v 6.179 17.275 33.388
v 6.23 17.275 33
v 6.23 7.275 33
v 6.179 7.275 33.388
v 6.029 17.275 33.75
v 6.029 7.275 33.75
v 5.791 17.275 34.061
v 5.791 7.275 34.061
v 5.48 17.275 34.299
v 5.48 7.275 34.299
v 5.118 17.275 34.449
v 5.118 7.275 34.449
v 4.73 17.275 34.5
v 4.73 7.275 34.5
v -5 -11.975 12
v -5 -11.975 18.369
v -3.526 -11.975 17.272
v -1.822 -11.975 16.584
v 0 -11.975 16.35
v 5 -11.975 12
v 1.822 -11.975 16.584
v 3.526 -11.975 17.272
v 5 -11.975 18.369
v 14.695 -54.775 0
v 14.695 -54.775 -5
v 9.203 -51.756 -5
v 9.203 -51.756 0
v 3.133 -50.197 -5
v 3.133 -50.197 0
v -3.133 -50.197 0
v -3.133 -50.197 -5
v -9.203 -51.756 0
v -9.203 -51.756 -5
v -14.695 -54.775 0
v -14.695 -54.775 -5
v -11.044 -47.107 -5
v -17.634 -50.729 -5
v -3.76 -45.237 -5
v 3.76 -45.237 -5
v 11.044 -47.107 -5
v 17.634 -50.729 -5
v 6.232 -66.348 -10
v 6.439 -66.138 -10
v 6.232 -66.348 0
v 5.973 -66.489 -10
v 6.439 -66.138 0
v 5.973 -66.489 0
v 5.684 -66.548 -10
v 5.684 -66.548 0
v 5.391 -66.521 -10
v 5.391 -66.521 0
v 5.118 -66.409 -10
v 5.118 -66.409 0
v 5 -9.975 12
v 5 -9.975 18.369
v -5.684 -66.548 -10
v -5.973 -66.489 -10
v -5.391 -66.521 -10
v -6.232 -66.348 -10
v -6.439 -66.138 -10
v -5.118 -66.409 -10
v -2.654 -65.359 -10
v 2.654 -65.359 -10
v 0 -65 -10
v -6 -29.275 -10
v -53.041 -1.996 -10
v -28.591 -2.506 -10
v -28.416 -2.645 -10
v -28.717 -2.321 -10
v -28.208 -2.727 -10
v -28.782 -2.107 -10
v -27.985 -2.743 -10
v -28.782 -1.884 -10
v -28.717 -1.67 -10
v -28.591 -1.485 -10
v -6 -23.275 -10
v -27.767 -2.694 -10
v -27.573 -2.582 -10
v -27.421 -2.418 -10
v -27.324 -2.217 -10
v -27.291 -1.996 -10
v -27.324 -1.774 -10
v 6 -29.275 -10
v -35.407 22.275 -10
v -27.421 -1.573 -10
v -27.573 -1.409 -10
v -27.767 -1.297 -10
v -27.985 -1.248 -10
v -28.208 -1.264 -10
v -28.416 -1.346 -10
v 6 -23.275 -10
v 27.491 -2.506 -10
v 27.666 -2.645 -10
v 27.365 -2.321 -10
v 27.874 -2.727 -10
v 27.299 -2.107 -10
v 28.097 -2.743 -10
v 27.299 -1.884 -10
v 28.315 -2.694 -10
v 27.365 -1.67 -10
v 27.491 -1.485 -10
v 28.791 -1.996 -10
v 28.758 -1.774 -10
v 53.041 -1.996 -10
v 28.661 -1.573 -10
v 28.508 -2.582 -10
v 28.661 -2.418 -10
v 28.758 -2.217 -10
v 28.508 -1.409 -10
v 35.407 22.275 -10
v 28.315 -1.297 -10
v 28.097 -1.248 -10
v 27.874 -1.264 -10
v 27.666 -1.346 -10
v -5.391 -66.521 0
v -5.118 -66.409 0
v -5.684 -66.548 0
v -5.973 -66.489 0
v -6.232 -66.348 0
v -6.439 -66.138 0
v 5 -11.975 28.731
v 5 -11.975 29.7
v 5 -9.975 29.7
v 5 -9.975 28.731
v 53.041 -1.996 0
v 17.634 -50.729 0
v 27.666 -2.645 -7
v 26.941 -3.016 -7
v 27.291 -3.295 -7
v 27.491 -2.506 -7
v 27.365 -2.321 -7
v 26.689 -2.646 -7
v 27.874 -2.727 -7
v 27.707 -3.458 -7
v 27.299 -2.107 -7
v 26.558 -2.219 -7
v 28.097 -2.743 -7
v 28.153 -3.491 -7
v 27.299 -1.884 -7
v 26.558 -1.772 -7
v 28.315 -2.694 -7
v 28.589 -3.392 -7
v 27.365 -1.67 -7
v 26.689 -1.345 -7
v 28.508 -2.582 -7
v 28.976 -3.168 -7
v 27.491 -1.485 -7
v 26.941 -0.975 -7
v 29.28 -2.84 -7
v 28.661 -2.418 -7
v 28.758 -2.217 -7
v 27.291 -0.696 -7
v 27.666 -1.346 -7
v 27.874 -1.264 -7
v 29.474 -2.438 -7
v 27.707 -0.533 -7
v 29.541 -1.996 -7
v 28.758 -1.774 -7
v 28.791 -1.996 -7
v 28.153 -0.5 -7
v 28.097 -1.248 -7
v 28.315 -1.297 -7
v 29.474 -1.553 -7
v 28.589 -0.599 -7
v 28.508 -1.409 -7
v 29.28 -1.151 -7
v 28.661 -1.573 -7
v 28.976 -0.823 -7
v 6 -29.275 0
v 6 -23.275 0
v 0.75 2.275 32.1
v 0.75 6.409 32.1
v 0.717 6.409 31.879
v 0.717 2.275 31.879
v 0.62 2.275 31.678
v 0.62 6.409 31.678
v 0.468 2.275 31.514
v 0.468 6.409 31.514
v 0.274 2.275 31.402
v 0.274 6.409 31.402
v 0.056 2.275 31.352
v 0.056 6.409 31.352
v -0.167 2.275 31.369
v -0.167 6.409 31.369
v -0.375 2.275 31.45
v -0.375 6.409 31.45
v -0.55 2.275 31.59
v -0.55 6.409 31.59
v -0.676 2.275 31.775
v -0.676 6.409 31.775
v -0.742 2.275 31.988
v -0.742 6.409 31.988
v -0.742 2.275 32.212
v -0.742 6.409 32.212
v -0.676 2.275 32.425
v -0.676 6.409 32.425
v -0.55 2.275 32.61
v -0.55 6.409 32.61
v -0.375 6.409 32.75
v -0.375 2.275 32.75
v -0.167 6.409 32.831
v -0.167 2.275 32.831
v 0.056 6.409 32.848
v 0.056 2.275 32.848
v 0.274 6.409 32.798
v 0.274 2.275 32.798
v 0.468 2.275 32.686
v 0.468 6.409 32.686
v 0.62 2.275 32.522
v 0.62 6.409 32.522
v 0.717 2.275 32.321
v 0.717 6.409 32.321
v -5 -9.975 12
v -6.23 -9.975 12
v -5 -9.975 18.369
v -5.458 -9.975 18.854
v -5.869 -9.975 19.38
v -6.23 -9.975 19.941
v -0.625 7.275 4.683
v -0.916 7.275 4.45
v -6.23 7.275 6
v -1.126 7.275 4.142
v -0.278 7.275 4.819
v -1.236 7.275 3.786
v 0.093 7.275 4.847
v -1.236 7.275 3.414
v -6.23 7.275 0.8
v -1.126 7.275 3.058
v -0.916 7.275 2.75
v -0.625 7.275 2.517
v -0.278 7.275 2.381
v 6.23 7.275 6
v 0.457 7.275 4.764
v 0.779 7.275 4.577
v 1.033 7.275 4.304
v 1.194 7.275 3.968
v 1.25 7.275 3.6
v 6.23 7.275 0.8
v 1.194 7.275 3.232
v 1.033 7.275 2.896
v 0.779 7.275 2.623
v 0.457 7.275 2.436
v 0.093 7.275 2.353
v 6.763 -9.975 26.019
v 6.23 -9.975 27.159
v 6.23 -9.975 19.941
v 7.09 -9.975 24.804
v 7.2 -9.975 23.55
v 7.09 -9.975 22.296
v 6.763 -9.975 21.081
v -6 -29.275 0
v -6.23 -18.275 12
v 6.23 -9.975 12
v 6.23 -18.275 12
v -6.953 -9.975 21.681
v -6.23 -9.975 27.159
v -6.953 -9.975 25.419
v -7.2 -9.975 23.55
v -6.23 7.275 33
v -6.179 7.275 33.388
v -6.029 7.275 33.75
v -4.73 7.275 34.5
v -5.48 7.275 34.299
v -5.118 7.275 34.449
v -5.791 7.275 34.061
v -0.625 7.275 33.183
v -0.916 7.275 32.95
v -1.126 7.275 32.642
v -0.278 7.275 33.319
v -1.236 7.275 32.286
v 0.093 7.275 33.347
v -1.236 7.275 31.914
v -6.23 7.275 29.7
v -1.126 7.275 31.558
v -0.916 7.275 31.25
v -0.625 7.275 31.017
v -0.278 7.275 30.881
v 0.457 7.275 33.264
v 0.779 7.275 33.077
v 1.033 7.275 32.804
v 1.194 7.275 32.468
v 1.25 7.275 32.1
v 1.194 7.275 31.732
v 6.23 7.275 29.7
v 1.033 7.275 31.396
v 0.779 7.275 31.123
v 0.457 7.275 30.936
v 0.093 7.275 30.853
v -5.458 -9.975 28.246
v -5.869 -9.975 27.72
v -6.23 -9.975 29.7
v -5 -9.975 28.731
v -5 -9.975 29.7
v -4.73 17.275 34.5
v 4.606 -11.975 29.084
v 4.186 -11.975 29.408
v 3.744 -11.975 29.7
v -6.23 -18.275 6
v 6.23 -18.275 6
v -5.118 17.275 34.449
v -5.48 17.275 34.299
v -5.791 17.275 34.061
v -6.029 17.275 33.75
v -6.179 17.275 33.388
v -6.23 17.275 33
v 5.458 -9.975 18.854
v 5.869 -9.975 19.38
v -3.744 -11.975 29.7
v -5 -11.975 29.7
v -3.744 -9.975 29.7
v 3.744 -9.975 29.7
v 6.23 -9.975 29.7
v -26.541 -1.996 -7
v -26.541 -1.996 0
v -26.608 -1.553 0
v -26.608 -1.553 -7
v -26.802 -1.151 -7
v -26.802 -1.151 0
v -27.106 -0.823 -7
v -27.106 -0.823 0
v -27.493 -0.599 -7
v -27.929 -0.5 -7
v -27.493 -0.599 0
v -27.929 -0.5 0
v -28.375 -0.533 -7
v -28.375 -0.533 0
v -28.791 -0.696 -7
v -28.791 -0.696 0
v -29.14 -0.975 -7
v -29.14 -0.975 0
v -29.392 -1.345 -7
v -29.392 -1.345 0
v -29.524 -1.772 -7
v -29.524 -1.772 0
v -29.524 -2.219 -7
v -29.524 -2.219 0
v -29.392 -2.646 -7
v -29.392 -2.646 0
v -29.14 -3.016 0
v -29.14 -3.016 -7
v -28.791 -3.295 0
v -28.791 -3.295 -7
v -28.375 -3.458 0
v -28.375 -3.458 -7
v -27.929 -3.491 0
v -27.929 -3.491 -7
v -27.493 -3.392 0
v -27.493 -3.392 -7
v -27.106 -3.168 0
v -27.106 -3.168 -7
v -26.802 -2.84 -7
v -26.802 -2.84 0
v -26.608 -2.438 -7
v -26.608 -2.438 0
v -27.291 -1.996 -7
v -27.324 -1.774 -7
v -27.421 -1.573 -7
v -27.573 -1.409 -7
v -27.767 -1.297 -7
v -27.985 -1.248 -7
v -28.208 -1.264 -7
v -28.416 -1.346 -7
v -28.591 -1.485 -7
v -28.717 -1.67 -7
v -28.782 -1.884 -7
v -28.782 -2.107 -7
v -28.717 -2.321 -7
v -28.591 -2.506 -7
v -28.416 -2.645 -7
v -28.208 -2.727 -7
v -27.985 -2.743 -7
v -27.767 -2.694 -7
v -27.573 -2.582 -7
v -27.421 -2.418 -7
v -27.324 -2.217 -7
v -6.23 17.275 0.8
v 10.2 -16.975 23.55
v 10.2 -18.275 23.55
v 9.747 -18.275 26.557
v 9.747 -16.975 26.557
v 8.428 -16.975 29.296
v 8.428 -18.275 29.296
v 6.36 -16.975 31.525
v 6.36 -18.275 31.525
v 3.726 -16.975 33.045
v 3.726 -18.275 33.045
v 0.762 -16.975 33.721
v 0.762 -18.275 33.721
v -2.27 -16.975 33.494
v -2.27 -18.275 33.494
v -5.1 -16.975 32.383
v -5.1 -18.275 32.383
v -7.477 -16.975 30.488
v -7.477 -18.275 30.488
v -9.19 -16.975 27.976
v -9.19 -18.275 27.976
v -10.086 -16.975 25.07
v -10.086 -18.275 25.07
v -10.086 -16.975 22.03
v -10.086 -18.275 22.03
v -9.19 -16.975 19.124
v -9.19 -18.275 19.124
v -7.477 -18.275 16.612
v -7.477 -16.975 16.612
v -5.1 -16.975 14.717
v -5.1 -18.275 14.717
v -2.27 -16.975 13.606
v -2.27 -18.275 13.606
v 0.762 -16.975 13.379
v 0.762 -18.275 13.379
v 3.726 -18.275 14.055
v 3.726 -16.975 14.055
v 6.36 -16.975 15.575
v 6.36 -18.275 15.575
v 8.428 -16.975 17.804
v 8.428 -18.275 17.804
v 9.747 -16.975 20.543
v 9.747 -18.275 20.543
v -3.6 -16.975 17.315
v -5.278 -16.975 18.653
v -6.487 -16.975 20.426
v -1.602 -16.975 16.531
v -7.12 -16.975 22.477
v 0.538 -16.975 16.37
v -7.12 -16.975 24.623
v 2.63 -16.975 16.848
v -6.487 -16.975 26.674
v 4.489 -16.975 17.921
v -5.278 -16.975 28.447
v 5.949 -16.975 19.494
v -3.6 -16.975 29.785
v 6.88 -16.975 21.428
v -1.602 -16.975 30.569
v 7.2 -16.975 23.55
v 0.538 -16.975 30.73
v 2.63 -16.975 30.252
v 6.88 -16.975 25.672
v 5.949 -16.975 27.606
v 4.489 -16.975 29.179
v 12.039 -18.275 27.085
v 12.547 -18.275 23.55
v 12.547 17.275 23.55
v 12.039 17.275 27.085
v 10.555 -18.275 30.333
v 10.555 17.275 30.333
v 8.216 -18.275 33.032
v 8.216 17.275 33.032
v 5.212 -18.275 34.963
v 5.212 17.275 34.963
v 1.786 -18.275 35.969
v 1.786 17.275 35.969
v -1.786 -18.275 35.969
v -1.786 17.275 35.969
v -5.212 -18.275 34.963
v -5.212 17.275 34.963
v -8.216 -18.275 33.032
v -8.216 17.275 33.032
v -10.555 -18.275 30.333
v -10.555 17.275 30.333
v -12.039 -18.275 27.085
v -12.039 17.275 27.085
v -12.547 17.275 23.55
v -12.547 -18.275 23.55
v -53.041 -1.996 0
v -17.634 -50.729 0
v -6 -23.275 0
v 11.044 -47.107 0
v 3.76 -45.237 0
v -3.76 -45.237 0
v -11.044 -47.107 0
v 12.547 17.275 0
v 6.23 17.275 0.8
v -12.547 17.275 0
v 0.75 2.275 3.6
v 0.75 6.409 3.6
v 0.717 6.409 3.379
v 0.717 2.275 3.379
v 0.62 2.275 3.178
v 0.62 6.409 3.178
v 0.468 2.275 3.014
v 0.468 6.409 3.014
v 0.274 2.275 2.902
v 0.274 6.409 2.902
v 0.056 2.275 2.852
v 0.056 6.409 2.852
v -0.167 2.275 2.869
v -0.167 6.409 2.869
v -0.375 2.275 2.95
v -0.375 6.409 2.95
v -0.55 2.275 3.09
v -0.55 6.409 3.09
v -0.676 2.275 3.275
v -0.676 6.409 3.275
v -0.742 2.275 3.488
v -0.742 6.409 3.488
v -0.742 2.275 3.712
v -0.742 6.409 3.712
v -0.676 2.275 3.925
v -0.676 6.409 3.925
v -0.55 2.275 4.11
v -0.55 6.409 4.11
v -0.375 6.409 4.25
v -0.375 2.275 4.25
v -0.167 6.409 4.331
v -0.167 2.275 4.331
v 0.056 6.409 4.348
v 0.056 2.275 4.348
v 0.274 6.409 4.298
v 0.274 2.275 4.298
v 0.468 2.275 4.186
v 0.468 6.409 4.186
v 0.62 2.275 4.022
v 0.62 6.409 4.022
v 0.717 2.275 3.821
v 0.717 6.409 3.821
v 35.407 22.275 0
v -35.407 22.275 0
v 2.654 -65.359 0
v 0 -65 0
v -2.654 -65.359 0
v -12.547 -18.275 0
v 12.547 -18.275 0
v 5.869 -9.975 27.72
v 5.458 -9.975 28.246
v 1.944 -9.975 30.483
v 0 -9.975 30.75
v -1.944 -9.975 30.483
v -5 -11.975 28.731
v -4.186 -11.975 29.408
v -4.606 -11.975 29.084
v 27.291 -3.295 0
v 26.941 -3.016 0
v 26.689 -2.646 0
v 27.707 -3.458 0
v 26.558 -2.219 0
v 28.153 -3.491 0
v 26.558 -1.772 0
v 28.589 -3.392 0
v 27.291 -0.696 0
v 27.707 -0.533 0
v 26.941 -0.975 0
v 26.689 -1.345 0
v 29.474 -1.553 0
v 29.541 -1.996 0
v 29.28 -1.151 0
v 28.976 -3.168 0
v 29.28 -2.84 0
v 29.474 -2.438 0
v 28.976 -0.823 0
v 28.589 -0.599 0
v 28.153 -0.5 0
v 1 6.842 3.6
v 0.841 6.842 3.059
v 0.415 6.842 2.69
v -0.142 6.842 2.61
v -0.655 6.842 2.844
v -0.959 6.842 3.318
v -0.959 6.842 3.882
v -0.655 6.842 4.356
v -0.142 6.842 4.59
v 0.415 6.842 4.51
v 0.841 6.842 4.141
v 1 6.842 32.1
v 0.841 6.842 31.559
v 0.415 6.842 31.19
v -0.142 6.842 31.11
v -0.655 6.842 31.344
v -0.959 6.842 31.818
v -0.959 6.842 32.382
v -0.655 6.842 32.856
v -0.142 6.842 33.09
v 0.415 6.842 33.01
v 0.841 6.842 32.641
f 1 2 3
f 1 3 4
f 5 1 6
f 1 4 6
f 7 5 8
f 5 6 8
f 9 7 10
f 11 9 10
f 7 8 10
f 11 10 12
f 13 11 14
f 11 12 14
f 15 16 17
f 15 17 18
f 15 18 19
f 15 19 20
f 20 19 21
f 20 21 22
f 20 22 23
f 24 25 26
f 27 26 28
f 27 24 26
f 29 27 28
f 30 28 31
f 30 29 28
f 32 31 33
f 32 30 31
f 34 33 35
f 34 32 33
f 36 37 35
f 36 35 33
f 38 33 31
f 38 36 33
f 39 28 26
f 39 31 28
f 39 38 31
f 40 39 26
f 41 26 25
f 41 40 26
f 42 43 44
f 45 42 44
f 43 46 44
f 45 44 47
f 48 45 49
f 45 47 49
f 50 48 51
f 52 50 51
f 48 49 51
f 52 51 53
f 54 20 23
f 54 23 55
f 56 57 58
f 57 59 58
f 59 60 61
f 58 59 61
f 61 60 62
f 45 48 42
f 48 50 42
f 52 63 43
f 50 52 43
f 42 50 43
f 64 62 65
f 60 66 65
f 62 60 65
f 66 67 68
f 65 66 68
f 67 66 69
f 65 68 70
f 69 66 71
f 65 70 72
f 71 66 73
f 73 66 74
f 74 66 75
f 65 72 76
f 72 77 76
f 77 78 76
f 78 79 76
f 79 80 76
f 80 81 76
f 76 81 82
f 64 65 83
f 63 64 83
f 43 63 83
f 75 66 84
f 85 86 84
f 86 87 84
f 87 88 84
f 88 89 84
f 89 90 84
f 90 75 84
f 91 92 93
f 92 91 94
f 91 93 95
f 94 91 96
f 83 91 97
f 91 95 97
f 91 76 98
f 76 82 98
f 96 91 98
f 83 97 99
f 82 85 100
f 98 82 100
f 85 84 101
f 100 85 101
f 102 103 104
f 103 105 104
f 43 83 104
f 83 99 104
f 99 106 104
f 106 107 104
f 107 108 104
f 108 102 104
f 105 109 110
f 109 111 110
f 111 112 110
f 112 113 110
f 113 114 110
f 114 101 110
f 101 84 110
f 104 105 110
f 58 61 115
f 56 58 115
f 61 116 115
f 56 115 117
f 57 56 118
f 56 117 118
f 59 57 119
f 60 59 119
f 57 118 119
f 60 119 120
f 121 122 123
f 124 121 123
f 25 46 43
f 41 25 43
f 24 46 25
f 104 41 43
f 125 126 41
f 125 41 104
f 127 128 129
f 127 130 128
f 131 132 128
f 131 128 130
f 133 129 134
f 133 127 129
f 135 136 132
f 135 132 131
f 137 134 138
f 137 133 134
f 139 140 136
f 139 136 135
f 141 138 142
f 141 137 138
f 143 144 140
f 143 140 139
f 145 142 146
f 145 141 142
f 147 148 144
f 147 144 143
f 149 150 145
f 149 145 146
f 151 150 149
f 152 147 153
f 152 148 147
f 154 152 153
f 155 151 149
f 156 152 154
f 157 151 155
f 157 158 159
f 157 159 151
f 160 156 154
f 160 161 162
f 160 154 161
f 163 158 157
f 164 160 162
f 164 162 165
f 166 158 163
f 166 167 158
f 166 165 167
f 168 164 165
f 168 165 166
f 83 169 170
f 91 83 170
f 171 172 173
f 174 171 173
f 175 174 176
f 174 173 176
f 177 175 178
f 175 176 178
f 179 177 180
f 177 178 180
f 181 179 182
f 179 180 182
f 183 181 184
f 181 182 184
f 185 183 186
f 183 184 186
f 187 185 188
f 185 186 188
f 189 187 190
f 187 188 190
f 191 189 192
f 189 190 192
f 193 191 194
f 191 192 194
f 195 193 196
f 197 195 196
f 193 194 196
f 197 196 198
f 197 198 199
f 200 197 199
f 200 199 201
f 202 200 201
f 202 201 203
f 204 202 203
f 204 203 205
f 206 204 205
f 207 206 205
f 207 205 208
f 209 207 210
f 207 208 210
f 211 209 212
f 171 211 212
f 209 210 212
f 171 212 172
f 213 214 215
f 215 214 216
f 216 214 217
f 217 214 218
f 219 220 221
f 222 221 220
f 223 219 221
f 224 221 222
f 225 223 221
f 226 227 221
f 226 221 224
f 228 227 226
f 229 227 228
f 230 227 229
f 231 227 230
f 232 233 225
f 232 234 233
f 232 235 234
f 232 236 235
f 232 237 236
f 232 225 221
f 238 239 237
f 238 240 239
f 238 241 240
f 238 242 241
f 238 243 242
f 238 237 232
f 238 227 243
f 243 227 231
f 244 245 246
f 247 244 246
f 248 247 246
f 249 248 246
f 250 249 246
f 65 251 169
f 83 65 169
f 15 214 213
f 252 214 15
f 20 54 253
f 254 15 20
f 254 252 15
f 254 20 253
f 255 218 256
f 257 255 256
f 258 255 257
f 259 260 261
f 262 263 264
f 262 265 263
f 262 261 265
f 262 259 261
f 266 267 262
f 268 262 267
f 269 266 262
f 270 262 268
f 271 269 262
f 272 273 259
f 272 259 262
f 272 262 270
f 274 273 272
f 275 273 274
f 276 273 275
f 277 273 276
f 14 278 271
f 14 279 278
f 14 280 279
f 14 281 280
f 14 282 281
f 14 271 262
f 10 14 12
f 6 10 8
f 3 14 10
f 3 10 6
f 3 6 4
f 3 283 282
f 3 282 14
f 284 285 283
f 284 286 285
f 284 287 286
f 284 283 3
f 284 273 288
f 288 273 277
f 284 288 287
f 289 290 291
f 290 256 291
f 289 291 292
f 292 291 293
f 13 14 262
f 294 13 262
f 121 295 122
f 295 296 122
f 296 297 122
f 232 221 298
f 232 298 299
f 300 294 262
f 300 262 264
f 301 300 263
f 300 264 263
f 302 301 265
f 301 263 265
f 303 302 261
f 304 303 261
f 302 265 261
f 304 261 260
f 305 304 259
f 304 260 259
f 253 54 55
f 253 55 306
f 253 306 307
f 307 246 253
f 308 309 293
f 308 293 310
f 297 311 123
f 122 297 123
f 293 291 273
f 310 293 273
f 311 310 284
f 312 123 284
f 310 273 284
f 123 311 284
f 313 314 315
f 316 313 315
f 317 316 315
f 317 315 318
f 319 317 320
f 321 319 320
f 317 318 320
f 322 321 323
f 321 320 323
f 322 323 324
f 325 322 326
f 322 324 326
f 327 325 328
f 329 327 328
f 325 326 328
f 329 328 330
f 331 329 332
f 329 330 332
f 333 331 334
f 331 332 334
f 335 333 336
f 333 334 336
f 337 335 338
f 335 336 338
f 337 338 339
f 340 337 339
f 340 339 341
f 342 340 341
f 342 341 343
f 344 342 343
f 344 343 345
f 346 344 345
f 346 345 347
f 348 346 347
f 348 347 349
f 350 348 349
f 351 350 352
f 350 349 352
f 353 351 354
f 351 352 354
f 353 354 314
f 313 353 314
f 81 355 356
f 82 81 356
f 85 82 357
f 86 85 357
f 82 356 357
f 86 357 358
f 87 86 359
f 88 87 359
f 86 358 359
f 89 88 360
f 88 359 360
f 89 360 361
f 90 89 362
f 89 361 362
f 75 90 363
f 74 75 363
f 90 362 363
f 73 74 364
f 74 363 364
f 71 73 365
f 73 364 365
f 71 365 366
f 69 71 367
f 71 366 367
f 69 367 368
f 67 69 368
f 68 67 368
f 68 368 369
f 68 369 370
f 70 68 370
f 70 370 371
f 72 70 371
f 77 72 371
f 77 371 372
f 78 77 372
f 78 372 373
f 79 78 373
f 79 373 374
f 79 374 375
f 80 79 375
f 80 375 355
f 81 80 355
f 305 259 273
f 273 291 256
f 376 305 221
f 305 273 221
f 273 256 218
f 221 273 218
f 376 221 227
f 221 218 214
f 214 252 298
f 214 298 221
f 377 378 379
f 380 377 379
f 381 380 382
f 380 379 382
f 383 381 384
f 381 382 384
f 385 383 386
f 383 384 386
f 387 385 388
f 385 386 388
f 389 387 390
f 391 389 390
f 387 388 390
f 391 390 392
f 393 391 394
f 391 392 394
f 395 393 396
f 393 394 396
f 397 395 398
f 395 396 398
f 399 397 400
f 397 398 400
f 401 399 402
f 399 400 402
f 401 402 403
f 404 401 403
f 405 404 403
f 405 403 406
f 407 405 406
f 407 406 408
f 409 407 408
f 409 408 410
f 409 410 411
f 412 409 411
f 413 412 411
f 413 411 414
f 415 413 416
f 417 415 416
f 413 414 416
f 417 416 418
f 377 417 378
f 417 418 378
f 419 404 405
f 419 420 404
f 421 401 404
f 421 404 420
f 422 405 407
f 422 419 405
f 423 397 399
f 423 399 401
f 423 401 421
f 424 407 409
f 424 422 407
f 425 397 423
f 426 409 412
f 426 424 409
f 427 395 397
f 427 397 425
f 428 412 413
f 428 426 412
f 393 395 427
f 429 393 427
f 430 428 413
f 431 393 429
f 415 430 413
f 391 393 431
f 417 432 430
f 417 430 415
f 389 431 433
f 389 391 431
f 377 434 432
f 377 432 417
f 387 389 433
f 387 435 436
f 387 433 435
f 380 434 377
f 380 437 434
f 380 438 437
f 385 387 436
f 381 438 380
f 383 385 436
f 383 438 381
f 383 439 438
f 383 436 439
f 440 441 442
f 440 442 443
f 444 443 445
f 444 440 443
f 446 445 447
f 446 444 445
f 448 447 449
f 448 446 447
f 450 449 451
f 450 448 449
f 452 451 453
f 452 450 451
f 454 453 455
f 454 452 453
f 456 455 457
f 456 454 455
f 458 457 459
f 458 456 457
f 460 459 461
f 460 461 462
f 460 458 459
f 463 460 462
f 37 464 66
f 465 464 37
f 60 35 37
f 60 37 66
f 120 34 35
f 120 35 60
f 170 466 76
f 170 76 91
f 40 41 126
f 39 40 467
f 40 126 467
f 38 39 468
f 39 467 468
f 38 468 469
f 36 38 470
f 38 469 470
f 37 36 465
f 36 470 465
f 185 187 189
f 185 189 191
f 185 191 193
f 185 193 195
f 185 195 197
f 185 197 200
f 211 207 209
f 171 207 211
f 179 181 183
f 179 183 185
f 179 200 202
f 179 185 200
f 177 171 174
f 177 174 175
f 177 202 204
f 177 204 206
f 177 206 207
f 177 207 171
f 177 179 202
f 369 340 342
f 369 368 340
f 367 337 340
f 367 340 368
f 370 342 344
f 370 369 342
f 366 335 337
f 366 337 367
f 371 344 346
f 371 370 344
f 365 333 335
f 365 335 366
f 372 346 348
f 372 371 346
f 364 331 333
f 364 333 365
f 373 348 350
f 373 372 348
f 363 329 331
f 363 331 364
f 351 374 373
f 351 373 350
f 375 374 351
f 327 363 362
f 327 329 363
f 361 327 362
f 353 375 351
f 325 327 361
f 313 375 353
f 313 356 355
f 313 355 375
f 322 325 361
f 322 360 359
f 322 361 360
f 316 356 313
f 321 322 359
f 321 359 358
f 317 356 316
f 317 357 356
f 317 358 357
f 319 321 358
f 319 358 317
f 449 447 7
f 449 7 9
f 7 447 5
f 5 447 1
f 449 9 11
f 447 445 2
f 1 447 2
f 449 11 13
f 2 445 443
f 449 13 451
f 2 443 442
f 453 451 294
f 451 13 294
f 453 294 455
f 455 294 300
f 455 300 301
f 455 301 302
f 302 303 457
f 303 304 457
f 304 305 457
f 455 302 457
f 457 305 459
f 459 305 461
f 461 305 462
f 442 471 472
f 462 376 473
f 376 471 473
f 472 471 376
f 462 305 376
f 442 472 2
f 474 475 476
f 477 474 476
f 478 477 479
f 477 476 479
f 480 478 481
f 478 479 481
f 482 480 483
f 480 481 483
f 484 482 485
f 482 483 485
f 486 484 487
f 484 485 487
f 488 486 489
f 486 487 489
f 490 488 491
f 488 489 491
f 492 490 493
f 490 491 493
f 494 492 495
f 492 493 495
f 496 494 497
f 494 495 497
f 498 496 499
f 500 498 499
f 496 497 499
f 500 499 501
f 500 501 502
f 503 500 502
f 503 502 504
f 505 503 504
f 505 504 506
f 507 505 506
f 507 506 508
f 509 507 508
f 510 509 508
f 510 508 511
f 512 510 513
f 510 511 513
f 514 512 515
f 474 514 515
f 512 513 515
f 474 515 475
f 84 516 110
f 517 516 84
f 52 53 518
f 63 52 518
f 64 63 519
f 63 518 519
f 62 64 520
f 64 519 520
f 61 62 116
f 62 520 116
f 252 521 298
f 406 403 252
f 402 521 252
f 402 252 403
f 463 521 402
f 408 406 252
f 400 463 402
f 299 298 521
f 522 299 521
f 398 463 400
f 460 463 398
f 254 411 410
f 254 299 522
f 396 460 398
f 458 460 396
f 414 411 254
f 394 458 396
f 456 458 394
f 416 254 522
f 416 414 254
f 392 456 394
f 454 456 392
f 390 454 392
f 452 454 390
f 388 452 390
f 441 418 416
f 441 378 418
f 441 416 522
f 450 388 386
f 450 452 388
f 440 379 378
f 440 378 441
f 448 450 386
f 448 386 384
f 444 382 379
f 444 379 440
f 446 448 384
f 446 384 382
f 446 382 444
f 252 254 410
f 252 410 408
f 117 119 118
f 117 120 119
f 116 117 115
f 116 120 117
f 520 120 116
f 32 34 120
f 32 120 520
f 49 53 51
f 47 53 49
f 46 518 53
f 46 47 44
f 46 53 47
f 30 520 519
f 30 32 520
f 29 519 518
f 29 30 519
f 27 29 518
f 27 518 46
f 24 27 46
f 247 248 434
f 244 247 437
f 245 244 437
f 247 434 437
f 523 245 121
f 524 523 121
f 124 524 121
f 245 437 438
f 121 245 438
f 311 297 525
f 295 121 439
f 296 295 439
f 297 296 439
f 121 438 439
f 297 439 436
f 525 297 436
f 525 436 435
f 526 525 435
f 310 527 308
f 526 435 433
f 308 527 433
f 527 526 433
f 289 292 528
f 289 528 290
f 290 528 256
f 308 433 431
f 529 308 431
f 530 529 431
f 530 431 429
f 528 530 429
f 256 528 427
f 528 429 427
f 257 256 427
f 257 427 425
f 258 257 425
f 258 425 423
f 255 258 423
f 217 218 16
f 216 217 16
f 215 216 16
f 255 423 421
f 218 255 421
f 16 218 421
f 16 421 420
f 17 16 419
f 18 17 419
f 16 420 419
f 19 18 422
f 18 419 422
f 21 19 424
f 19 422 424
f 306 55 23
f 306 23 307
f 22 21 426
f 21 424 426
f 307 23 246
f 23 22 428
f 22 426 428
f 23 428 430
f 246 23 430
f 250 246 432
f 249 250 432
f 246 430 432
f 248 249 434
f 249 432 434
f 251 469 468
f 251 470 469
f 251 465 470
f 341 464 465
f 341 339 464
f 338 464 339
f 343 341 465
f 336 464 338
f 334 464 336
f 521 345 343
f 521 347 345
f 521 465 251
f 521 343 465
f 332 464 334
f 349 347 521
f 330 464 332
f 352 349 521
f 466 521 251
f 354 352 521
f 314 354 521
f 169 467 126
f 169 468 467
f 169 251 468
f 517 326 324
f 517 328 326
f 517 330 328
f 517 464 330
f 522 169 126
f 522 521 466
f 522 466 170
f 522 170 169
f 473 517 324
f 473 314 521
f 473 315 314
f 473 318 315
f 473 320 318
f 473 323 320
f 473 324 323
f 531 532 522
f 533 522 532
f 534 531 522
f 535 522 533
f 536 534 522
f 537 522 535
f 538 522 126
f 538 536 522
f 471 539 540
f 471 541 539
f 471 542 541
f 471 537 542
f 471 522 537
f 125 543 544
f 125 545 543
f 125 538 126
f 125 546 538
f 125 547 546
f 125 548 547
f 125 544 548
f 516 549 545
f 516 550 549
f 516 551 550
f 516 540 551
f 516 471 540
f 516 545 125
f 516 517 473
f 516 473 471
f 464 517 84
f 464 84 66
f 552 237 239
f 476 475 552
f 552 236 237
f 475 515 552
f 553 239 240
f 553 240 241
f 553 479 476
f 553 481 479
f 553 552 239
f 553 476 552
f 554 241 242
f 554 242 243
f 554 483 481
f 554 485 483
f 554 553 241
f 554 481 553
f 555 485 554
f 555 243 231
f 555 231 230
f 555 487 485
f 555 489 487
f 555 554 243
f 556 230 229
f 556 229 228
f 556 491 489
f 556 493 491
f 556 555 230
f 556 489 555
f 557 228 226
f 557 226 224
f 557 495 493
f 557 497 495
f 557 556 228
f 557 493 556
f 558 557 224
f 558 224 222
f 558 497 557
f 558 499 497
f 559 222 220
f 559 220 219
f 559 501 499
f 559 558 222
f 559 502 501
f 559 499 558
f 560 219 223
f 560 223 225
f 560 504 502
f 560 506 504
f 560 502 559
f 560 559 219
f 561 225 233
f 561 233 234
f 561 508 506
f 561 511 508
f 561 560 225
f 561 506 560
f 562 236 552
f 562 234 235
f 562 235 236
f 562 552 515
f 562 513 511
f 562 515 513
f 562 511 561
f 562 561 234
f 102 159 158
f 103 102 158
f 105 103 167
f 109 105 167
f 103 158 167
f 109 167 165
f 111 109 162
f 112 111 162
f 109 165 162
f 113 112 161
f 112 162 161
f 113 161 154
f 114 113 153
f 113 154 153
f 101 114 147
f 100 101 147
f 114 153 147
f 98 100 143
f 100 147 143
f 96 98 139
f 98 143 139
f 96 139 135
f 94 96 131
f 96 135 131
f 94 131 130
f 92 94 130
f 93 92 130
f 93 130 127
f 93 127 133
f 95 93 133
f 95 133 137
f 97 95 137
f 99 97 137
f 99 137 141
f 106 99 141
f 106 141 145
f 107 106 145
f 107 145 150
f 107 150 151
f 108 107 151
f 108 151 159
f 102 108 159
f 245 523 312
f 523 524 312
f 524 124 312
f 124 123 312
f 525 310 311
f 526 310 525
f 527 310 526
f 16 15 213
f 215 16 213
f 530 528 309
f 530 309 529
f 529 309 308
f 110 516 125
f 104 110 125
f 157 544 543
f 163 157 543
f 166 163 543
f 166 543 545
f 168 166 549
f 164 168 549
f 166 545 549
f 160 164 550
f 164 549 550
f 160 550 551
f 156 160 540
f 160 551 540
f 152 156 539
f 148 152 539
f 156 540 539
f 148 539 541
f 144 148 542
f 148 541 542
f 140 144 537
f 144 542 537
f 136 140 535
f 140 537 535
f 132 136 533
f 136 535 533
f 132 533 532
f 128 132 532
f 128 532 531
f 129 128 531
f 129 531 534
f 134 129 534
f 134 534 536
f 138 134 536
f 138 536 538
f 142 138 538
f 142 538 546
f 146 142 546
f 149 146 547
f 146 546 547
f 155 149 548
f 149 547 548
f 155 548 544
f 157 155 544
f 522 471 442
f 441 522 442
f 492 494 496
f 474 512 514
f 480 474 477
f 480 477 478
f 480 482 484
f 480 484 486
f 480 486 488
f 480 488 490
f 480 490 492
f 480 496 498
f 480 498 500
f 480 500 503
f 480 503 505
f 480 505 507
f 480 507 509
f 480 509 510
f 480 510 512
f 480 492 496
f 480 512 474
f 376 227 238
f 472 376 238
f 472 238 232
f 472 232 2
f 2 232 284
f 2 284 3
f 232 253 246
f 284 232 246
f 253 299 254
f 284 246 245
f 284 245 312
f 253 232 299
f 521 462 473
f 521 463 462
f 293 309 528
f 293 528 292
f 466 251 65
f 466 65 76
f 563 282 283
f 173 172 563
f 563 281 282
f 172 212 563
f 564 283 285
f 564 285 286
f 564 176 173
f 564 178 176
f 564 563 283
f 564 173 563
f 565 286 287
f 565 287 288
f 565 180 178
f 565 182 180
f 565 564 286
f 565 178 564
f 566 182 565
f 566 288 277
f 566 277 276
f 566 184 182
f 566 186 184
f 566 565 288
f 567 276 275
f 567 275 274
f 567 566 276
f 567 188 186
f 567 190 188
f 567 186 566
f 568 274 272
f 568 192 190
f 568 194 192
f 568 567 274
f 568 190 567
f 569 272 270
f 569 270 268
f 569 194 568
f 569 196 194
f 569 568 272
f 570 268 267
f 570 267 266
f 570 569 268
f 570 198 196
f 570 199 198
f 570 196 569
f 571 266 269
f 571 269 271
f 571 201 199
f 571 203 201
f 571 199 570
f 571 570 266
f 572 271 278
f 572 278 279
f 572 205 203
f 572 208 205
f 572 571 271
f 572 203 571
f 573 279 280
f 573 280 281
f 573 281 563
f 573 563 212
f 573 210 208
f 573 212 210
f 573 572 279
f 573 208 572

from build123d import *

# Parameters (mm, degrees)
SKETCH4_W                = 12.46
SKETCH4_H                = 17.25
BOSS_EXTRUDE3_DEPTH      = 6
SKETCH8_R                = 12.546781182
SKETCH8_R_2              = 11.15
BOSS_EXTRUDE6_DEPTH      = 8.3
BOSS_EXTRUDE6_DEPTH_BACK = 17.25
BOSS_EXTRUDE4_DEPTH      = 17.25
SKETCH6_R                = 0.75
CUT_EXTRUDE1_DEPTH       = 5
CHAMFER1_SIZE            = 0.5
CHAMFER1_SIZE2           = 0.866025404
SKETCH10_W               = 12.46
SKETCH10_H               = 23.7
CUT_EXTRUDE3_DEPTH       = 17.25
BOSS_EXTRUDE7_DEPTH      = 8.3
BOSS_EXTRUDE9_DEPTH      = 10
SKETCH16_R               = 11.15
SKETCH16_R_2             = 7.2
BOSS_EXTRUDE10_DEPTH     = 8.3
SKETCH17_R               = 10.2
SKETCH17_R_2             = 7.2
CUT_EXTRUDE5_DEPTH       = 1.3
SKETCH11_W               = 10
SKETCH11_H               = 2
CUT_EXTRUDE4_DEPTH       = 23.7
CUT_EXTRUDE7_REACH       = 37.55
SKETCH19_W               = 12.46
SKETCH19_H               = 6
OFFSET_R_DEPTH           = 10
SKETCH21_R               = 30
SKETCH21_R_2             = 25
CUT_EXTRUDE9_DEPTH       = 5
SKETCH22_W               = 12
SKETCH22_H               = 6
CUT_EXTRUDE10_DEPTH      = 11
SKETCH20_R               = 10
CUT_EXTRUDE8_DEPTH       = 10
FILLET1_R                = 1
CUT_EXTRUDE11_DEPTH      = 11
SKETCH24_R               = 0.75
CUT_EXTRUDE12_DEPTH      = 11
SKETCH25_R               = 1.5
CUT_EXTRUDE13_DEPTH      = 7


with BuildPart() as part:
    # Sketch4 → Boss-Extrude3 (new body)
    with BuildSketch(Plane.XY):
        with Locations((0, -1.35)):
            Rectangle(SKETCH4_W, SKETCH4_H)
    extrude(amount=BOSS_EXTRUDE3_DEPTH)



with BuildPart() as body_2:
    # Sketch8 → Boss-Extrude6 (new body, two sides)
    with BuildSketch(Plane(origin=(0, -9.975, 0), x_dir=(-1, 0, 0), z_dir=(0, -1, 0))) as boss_extrude6_sk:
        with Locations((0, -23.55)):
            Circle(SKETCH8_R)
        with Locations((0, -23.55)):
            Circle(SKETCH8_R_2, mode=Mode.SUBTRACT)
    extrude(amount=BOSS_EXTRUDE6_DEPTH)
    extrude(boss_extrude6_sk.sketch, amount=-BOSS_EXTRUDE6_DEPTH_BACK)


with BuildPart() as part_1:
    add(part.part)

    add(body_2.part)  # Boss-Extrude4 merges body 2
    # Sketch5 → Boss-Extrude4 (add)
    with BuildSketch(Plane(origin=(0, 7.275, 0), x_dir=(1, 0, 0), z_dir=(0, 1, 0))):
        with BuildLine():
            Line((12.546781182, -23.55), (12.546781182, 0))
            Line((12.546781182, 0), (6.23, 0))
            Line((6.23, 0), (6.23, -29.7))
            Line((6.23, -29.7), (-6.23, -29.7))
            Line((-6.23, -29.7), (-6.23, 0))
            Line((-6.23, 0), (-12.546781182, 0))
            Line((-12.546781182, 0), (-12.546781182, -23.55))
            ThreePointArc((-12.546781182, -23.55), (0, -36.096781182), (12.546781182, -23.55))
        make_face()
    extrude(amount=-BOSS_EXTRUDE4_DEPTH)

    # Sketch6 → Cut-Extrude1 (cut)
    with BuildSketch(Plane(origin=(0, 7.275, 0), x_dir=(1, 0, 0), z_dir=(0, 1, 0))):
        with Locations((0, -3.6)):
            Circle(SKETCH6_R)
        with Locations((0, -32.1)):
            Circle(SKETCH6_R)
    extrude(amount=-CUT_EXTRUDE1_DEPTH, mode=Mode.SUBTRACT)

    # Chamfer1
    chamfer1_edges = [part_1.edges().sort_by_distance(p)[0] for p in [
        (-0.75, 7.275, 3.6),
        (-0.75, 7.275, 32.1),
    ]]
    chamfer1_side = [part_1.faces().sort_by_distance(p)[0] for p in [
        (0, 7.275, 35.657160381),
    ]]
    chamfer(chamfer1_edges, length=CHAMFER1_SIZE, length2=CHAMFER1_SIZE2, reference=chamfer1_side[0])

    # Sketch10 → Cut-Extrude3 (cut)
    with BuildSketch(Plane(origin=(0, 7.275, 0), x_dir=(1, 0, 0), z_dir=(0, 1, 0))):
        with Locations((0, -17.85)):
            Rectangle(SKETCH10_W, SKETCH10_H)
    extrude(amount=-CUT_EXTRUDE3_DEPTH, mode=Mode.SUBTRACT)

    # Sketch13 → Boss-Extrude7 (add)
    with BuildSketch(Plane.XZ.offset(18.275)):
        with BuildLine():
            Line((-12.546781182, 23.55), (-12.546781182, 0))
            Line((-12.546781182, 0), (12.546781182, 0))
            Line((12.546781182, 0), (12.546781182, 23.55))
            ThreePointArc((12.546781182, 23.55), (0, 11.003218818), (-12.546781182, 23.55))
        make_face()
    extrude(amount=-BOSS_EXTRUDE7_DEPTH)

    # Sketch15 → Boss-Extrude9 (add)
    with BuildSketch(Plane(origin=(0, 7.275, 0), x_dir=(1, 0, 0), z_dir=(0, 1, 0))):
        with BuildLine():
            Line((-12.546781182, 0), (12.546781182, 0))
            Line((12.546781182, 0), (12.546781182, -23.55))
            ThreePointArc((12.546781182, -23.55), (0, -36.096781182), (-12.546781182, -23.55))
            Line((-12.546781182, -23.55), (-12.546781182, 0))
        make_face()
        with BuildLine():
            Line((-6.23, -0.8), (6.23, -0.8))
            Line((6.23, -0.8), (6.23, -33))
            ThreePointArc((6.23, -33), (5.790660172, -34.060660172), (4.73, -34.5))
            Line((4.73, -34.5), (-4.73, -34.5))
            ThreePointArc((-4.73, -34.5), (-5.790660172, -34.060660172), (-6.23, -33))
            Line((-6.23, -33), (-6.23, -0.8))
        make_face(mode=Mode.SUBTRACT)
    extrude(amount=BOSS_EXTRUDE9_DEPTH)

    # Sketch16 → Boss-Extrude10 (add)
    with BuildSketch(Plane.XZ.offset(18.275)):
        with Locations((0, 23.55)):
            Circle(SKETCH16_R)
        with Locations((0, 23.55)):
            Circle(SKETCH16_R_2, mode=Mode.SUBTRACT)
    extrude(amount=-BOSS_EXTRUDE10_DEPTH)

    # Sketch17 → Cut-Extrude5 (cut)
    with BuildSketch(Plane.XZ.offset(18.275)):
        with Locations((0, 23.55)):
            Circle(SKETCH17_R)
        with Locations((0, 23.55)):
            Circle(SKETCH17_R_2, mode=Mode.SUBTRACT)
    extrude(amount=-CUT_EXTRUDE5_DEPTH, mode=Mode.SUBTRACT)

    # Sketch11 → Cut-Extrude4 (cut)
    with BuildSketch(Plane.XY.offset(29.7)):
        with Locations((0, -10.975)):
            Rectangle(SKETCH11_W, SKETCH11_H)
    extrude(amount=-CUT_EXTRUDE4_DEPTH, mode=Mode.SUBTRACT)

    # Sketch19 → Cut-Extrude7 (cut, up to next)
    with BuildSketch(Plane.XZ.offset(18.275), mode=Mode.PRIVATE) as cut_extrude7_sk1:
        with Locations((0, 9)):
            Rectangle(SKETCH19_W, SKETCH19_H)
    cut_extrude7_tool1 = extrude(cut_extrude7_sk1.sketch, amount=-CUT_EXTRUDE7_REACH, mode=Mode.PRIVATE) & part_1.part
    add(cut_extrude7_tool1.solids().sort_by_distance((0, -18.275, 9))[0], mode=Mode.SUBTRACT)

    # Sketch1 → Offset R (add)
    with BuildSketch(Plane.XY):
        Polygon((0, -75), (70.674424412, 22.275), (-70.674424412, 22.275), align=None)
    extrude(amount=-OFFSET_R_DEPTH)

    # Sketch21 → Cut-Extrude9 (cut)
    with BuildSketch(Plane.XY):
        with Locations((0, -75)):
            Circle(SKETCH21_R)
        with Locations((0, -75)):
            Circle(SKETCH21_R_2, mode=Mode.SUBTRACT)
    extrude(amount=-CUT_EXTRUDE9_DEPTH, mode=Mode.SUBTRACT)

    # Sketch22 → Cut-Extrude10 (cut, through all)
    with BuildSketch(Plane.XY):
        with Locations((0, -26.275)):
            Rectangle(SKETCH22_W, SKETCH22_H)
    extrude(amount=-CUT_EXTRUDE10_DEPTH, mode=Mode.SUBTRACT)

    # Sketch20 → Cut-Extrude8 (cut)
    with BuildSketch(Plane.XY):
        with Locations((0, -75)):
            Circle(SKETCH20_R)
    extrude(amount=-CUT_EXTRUDE8_DEPTH, mode=Mode.SUBTRACT)

    # Fillet1
    fillet1_edges = [part_1.edges().sort_by_distance(p)[0] for p in [
        (5.877852523, -66.909830056, -5),
        (-5.877852523, -66.909830056, -5),
    ]]
    fillet(fillet1_edges, radius=FILLET1_R)

    # Sketch23 → Cut-Extrude11 (cut, through all)
    with BuildSketch(Plane.XY):
        Polygon((-35.407309274, 22.275), (-53.040866843, -1.995509831), (-70.674424412, 22.275), align=None)
        Polygon((70.674424412, 22.275), (35.407309274, 22.275), (53.040866843, -1.995509831), align=None)
    extrude(amount=-CUT_EXTRUDE11_DEPTH, mode=Mode.SUBTRACT)

    # Sketch24 → Cut-Extrude12 (cut, through all)
    with BuildSketch(Plane.XY):
        with Locations((-28.040866843, -1.995509831)):
            Circle(SKETCH24_R)
        with Locations((28.040866843, -1.995509831)):
            Circle(SKETCH24_R)
    extrude(amount=-CUT_EXTRUDE12_DEPTH, mode=Mode.SUBTRACT)

    # Sketch25 → Cut-Extrude13 (cut)
    with BuildSketch(Plane.XY):
        with Locations((-28.040866843, -1.995509831)):
            Circle(SKETCH25_R)
        with Locations((28.040866843, -1.995509831)):
            Circle(SKETCH25_R)
    extrude(amount=-CUT_EXTRUDE13_DEPTH, mode=Mode.SUBTRACT)


solid = part_1.part
